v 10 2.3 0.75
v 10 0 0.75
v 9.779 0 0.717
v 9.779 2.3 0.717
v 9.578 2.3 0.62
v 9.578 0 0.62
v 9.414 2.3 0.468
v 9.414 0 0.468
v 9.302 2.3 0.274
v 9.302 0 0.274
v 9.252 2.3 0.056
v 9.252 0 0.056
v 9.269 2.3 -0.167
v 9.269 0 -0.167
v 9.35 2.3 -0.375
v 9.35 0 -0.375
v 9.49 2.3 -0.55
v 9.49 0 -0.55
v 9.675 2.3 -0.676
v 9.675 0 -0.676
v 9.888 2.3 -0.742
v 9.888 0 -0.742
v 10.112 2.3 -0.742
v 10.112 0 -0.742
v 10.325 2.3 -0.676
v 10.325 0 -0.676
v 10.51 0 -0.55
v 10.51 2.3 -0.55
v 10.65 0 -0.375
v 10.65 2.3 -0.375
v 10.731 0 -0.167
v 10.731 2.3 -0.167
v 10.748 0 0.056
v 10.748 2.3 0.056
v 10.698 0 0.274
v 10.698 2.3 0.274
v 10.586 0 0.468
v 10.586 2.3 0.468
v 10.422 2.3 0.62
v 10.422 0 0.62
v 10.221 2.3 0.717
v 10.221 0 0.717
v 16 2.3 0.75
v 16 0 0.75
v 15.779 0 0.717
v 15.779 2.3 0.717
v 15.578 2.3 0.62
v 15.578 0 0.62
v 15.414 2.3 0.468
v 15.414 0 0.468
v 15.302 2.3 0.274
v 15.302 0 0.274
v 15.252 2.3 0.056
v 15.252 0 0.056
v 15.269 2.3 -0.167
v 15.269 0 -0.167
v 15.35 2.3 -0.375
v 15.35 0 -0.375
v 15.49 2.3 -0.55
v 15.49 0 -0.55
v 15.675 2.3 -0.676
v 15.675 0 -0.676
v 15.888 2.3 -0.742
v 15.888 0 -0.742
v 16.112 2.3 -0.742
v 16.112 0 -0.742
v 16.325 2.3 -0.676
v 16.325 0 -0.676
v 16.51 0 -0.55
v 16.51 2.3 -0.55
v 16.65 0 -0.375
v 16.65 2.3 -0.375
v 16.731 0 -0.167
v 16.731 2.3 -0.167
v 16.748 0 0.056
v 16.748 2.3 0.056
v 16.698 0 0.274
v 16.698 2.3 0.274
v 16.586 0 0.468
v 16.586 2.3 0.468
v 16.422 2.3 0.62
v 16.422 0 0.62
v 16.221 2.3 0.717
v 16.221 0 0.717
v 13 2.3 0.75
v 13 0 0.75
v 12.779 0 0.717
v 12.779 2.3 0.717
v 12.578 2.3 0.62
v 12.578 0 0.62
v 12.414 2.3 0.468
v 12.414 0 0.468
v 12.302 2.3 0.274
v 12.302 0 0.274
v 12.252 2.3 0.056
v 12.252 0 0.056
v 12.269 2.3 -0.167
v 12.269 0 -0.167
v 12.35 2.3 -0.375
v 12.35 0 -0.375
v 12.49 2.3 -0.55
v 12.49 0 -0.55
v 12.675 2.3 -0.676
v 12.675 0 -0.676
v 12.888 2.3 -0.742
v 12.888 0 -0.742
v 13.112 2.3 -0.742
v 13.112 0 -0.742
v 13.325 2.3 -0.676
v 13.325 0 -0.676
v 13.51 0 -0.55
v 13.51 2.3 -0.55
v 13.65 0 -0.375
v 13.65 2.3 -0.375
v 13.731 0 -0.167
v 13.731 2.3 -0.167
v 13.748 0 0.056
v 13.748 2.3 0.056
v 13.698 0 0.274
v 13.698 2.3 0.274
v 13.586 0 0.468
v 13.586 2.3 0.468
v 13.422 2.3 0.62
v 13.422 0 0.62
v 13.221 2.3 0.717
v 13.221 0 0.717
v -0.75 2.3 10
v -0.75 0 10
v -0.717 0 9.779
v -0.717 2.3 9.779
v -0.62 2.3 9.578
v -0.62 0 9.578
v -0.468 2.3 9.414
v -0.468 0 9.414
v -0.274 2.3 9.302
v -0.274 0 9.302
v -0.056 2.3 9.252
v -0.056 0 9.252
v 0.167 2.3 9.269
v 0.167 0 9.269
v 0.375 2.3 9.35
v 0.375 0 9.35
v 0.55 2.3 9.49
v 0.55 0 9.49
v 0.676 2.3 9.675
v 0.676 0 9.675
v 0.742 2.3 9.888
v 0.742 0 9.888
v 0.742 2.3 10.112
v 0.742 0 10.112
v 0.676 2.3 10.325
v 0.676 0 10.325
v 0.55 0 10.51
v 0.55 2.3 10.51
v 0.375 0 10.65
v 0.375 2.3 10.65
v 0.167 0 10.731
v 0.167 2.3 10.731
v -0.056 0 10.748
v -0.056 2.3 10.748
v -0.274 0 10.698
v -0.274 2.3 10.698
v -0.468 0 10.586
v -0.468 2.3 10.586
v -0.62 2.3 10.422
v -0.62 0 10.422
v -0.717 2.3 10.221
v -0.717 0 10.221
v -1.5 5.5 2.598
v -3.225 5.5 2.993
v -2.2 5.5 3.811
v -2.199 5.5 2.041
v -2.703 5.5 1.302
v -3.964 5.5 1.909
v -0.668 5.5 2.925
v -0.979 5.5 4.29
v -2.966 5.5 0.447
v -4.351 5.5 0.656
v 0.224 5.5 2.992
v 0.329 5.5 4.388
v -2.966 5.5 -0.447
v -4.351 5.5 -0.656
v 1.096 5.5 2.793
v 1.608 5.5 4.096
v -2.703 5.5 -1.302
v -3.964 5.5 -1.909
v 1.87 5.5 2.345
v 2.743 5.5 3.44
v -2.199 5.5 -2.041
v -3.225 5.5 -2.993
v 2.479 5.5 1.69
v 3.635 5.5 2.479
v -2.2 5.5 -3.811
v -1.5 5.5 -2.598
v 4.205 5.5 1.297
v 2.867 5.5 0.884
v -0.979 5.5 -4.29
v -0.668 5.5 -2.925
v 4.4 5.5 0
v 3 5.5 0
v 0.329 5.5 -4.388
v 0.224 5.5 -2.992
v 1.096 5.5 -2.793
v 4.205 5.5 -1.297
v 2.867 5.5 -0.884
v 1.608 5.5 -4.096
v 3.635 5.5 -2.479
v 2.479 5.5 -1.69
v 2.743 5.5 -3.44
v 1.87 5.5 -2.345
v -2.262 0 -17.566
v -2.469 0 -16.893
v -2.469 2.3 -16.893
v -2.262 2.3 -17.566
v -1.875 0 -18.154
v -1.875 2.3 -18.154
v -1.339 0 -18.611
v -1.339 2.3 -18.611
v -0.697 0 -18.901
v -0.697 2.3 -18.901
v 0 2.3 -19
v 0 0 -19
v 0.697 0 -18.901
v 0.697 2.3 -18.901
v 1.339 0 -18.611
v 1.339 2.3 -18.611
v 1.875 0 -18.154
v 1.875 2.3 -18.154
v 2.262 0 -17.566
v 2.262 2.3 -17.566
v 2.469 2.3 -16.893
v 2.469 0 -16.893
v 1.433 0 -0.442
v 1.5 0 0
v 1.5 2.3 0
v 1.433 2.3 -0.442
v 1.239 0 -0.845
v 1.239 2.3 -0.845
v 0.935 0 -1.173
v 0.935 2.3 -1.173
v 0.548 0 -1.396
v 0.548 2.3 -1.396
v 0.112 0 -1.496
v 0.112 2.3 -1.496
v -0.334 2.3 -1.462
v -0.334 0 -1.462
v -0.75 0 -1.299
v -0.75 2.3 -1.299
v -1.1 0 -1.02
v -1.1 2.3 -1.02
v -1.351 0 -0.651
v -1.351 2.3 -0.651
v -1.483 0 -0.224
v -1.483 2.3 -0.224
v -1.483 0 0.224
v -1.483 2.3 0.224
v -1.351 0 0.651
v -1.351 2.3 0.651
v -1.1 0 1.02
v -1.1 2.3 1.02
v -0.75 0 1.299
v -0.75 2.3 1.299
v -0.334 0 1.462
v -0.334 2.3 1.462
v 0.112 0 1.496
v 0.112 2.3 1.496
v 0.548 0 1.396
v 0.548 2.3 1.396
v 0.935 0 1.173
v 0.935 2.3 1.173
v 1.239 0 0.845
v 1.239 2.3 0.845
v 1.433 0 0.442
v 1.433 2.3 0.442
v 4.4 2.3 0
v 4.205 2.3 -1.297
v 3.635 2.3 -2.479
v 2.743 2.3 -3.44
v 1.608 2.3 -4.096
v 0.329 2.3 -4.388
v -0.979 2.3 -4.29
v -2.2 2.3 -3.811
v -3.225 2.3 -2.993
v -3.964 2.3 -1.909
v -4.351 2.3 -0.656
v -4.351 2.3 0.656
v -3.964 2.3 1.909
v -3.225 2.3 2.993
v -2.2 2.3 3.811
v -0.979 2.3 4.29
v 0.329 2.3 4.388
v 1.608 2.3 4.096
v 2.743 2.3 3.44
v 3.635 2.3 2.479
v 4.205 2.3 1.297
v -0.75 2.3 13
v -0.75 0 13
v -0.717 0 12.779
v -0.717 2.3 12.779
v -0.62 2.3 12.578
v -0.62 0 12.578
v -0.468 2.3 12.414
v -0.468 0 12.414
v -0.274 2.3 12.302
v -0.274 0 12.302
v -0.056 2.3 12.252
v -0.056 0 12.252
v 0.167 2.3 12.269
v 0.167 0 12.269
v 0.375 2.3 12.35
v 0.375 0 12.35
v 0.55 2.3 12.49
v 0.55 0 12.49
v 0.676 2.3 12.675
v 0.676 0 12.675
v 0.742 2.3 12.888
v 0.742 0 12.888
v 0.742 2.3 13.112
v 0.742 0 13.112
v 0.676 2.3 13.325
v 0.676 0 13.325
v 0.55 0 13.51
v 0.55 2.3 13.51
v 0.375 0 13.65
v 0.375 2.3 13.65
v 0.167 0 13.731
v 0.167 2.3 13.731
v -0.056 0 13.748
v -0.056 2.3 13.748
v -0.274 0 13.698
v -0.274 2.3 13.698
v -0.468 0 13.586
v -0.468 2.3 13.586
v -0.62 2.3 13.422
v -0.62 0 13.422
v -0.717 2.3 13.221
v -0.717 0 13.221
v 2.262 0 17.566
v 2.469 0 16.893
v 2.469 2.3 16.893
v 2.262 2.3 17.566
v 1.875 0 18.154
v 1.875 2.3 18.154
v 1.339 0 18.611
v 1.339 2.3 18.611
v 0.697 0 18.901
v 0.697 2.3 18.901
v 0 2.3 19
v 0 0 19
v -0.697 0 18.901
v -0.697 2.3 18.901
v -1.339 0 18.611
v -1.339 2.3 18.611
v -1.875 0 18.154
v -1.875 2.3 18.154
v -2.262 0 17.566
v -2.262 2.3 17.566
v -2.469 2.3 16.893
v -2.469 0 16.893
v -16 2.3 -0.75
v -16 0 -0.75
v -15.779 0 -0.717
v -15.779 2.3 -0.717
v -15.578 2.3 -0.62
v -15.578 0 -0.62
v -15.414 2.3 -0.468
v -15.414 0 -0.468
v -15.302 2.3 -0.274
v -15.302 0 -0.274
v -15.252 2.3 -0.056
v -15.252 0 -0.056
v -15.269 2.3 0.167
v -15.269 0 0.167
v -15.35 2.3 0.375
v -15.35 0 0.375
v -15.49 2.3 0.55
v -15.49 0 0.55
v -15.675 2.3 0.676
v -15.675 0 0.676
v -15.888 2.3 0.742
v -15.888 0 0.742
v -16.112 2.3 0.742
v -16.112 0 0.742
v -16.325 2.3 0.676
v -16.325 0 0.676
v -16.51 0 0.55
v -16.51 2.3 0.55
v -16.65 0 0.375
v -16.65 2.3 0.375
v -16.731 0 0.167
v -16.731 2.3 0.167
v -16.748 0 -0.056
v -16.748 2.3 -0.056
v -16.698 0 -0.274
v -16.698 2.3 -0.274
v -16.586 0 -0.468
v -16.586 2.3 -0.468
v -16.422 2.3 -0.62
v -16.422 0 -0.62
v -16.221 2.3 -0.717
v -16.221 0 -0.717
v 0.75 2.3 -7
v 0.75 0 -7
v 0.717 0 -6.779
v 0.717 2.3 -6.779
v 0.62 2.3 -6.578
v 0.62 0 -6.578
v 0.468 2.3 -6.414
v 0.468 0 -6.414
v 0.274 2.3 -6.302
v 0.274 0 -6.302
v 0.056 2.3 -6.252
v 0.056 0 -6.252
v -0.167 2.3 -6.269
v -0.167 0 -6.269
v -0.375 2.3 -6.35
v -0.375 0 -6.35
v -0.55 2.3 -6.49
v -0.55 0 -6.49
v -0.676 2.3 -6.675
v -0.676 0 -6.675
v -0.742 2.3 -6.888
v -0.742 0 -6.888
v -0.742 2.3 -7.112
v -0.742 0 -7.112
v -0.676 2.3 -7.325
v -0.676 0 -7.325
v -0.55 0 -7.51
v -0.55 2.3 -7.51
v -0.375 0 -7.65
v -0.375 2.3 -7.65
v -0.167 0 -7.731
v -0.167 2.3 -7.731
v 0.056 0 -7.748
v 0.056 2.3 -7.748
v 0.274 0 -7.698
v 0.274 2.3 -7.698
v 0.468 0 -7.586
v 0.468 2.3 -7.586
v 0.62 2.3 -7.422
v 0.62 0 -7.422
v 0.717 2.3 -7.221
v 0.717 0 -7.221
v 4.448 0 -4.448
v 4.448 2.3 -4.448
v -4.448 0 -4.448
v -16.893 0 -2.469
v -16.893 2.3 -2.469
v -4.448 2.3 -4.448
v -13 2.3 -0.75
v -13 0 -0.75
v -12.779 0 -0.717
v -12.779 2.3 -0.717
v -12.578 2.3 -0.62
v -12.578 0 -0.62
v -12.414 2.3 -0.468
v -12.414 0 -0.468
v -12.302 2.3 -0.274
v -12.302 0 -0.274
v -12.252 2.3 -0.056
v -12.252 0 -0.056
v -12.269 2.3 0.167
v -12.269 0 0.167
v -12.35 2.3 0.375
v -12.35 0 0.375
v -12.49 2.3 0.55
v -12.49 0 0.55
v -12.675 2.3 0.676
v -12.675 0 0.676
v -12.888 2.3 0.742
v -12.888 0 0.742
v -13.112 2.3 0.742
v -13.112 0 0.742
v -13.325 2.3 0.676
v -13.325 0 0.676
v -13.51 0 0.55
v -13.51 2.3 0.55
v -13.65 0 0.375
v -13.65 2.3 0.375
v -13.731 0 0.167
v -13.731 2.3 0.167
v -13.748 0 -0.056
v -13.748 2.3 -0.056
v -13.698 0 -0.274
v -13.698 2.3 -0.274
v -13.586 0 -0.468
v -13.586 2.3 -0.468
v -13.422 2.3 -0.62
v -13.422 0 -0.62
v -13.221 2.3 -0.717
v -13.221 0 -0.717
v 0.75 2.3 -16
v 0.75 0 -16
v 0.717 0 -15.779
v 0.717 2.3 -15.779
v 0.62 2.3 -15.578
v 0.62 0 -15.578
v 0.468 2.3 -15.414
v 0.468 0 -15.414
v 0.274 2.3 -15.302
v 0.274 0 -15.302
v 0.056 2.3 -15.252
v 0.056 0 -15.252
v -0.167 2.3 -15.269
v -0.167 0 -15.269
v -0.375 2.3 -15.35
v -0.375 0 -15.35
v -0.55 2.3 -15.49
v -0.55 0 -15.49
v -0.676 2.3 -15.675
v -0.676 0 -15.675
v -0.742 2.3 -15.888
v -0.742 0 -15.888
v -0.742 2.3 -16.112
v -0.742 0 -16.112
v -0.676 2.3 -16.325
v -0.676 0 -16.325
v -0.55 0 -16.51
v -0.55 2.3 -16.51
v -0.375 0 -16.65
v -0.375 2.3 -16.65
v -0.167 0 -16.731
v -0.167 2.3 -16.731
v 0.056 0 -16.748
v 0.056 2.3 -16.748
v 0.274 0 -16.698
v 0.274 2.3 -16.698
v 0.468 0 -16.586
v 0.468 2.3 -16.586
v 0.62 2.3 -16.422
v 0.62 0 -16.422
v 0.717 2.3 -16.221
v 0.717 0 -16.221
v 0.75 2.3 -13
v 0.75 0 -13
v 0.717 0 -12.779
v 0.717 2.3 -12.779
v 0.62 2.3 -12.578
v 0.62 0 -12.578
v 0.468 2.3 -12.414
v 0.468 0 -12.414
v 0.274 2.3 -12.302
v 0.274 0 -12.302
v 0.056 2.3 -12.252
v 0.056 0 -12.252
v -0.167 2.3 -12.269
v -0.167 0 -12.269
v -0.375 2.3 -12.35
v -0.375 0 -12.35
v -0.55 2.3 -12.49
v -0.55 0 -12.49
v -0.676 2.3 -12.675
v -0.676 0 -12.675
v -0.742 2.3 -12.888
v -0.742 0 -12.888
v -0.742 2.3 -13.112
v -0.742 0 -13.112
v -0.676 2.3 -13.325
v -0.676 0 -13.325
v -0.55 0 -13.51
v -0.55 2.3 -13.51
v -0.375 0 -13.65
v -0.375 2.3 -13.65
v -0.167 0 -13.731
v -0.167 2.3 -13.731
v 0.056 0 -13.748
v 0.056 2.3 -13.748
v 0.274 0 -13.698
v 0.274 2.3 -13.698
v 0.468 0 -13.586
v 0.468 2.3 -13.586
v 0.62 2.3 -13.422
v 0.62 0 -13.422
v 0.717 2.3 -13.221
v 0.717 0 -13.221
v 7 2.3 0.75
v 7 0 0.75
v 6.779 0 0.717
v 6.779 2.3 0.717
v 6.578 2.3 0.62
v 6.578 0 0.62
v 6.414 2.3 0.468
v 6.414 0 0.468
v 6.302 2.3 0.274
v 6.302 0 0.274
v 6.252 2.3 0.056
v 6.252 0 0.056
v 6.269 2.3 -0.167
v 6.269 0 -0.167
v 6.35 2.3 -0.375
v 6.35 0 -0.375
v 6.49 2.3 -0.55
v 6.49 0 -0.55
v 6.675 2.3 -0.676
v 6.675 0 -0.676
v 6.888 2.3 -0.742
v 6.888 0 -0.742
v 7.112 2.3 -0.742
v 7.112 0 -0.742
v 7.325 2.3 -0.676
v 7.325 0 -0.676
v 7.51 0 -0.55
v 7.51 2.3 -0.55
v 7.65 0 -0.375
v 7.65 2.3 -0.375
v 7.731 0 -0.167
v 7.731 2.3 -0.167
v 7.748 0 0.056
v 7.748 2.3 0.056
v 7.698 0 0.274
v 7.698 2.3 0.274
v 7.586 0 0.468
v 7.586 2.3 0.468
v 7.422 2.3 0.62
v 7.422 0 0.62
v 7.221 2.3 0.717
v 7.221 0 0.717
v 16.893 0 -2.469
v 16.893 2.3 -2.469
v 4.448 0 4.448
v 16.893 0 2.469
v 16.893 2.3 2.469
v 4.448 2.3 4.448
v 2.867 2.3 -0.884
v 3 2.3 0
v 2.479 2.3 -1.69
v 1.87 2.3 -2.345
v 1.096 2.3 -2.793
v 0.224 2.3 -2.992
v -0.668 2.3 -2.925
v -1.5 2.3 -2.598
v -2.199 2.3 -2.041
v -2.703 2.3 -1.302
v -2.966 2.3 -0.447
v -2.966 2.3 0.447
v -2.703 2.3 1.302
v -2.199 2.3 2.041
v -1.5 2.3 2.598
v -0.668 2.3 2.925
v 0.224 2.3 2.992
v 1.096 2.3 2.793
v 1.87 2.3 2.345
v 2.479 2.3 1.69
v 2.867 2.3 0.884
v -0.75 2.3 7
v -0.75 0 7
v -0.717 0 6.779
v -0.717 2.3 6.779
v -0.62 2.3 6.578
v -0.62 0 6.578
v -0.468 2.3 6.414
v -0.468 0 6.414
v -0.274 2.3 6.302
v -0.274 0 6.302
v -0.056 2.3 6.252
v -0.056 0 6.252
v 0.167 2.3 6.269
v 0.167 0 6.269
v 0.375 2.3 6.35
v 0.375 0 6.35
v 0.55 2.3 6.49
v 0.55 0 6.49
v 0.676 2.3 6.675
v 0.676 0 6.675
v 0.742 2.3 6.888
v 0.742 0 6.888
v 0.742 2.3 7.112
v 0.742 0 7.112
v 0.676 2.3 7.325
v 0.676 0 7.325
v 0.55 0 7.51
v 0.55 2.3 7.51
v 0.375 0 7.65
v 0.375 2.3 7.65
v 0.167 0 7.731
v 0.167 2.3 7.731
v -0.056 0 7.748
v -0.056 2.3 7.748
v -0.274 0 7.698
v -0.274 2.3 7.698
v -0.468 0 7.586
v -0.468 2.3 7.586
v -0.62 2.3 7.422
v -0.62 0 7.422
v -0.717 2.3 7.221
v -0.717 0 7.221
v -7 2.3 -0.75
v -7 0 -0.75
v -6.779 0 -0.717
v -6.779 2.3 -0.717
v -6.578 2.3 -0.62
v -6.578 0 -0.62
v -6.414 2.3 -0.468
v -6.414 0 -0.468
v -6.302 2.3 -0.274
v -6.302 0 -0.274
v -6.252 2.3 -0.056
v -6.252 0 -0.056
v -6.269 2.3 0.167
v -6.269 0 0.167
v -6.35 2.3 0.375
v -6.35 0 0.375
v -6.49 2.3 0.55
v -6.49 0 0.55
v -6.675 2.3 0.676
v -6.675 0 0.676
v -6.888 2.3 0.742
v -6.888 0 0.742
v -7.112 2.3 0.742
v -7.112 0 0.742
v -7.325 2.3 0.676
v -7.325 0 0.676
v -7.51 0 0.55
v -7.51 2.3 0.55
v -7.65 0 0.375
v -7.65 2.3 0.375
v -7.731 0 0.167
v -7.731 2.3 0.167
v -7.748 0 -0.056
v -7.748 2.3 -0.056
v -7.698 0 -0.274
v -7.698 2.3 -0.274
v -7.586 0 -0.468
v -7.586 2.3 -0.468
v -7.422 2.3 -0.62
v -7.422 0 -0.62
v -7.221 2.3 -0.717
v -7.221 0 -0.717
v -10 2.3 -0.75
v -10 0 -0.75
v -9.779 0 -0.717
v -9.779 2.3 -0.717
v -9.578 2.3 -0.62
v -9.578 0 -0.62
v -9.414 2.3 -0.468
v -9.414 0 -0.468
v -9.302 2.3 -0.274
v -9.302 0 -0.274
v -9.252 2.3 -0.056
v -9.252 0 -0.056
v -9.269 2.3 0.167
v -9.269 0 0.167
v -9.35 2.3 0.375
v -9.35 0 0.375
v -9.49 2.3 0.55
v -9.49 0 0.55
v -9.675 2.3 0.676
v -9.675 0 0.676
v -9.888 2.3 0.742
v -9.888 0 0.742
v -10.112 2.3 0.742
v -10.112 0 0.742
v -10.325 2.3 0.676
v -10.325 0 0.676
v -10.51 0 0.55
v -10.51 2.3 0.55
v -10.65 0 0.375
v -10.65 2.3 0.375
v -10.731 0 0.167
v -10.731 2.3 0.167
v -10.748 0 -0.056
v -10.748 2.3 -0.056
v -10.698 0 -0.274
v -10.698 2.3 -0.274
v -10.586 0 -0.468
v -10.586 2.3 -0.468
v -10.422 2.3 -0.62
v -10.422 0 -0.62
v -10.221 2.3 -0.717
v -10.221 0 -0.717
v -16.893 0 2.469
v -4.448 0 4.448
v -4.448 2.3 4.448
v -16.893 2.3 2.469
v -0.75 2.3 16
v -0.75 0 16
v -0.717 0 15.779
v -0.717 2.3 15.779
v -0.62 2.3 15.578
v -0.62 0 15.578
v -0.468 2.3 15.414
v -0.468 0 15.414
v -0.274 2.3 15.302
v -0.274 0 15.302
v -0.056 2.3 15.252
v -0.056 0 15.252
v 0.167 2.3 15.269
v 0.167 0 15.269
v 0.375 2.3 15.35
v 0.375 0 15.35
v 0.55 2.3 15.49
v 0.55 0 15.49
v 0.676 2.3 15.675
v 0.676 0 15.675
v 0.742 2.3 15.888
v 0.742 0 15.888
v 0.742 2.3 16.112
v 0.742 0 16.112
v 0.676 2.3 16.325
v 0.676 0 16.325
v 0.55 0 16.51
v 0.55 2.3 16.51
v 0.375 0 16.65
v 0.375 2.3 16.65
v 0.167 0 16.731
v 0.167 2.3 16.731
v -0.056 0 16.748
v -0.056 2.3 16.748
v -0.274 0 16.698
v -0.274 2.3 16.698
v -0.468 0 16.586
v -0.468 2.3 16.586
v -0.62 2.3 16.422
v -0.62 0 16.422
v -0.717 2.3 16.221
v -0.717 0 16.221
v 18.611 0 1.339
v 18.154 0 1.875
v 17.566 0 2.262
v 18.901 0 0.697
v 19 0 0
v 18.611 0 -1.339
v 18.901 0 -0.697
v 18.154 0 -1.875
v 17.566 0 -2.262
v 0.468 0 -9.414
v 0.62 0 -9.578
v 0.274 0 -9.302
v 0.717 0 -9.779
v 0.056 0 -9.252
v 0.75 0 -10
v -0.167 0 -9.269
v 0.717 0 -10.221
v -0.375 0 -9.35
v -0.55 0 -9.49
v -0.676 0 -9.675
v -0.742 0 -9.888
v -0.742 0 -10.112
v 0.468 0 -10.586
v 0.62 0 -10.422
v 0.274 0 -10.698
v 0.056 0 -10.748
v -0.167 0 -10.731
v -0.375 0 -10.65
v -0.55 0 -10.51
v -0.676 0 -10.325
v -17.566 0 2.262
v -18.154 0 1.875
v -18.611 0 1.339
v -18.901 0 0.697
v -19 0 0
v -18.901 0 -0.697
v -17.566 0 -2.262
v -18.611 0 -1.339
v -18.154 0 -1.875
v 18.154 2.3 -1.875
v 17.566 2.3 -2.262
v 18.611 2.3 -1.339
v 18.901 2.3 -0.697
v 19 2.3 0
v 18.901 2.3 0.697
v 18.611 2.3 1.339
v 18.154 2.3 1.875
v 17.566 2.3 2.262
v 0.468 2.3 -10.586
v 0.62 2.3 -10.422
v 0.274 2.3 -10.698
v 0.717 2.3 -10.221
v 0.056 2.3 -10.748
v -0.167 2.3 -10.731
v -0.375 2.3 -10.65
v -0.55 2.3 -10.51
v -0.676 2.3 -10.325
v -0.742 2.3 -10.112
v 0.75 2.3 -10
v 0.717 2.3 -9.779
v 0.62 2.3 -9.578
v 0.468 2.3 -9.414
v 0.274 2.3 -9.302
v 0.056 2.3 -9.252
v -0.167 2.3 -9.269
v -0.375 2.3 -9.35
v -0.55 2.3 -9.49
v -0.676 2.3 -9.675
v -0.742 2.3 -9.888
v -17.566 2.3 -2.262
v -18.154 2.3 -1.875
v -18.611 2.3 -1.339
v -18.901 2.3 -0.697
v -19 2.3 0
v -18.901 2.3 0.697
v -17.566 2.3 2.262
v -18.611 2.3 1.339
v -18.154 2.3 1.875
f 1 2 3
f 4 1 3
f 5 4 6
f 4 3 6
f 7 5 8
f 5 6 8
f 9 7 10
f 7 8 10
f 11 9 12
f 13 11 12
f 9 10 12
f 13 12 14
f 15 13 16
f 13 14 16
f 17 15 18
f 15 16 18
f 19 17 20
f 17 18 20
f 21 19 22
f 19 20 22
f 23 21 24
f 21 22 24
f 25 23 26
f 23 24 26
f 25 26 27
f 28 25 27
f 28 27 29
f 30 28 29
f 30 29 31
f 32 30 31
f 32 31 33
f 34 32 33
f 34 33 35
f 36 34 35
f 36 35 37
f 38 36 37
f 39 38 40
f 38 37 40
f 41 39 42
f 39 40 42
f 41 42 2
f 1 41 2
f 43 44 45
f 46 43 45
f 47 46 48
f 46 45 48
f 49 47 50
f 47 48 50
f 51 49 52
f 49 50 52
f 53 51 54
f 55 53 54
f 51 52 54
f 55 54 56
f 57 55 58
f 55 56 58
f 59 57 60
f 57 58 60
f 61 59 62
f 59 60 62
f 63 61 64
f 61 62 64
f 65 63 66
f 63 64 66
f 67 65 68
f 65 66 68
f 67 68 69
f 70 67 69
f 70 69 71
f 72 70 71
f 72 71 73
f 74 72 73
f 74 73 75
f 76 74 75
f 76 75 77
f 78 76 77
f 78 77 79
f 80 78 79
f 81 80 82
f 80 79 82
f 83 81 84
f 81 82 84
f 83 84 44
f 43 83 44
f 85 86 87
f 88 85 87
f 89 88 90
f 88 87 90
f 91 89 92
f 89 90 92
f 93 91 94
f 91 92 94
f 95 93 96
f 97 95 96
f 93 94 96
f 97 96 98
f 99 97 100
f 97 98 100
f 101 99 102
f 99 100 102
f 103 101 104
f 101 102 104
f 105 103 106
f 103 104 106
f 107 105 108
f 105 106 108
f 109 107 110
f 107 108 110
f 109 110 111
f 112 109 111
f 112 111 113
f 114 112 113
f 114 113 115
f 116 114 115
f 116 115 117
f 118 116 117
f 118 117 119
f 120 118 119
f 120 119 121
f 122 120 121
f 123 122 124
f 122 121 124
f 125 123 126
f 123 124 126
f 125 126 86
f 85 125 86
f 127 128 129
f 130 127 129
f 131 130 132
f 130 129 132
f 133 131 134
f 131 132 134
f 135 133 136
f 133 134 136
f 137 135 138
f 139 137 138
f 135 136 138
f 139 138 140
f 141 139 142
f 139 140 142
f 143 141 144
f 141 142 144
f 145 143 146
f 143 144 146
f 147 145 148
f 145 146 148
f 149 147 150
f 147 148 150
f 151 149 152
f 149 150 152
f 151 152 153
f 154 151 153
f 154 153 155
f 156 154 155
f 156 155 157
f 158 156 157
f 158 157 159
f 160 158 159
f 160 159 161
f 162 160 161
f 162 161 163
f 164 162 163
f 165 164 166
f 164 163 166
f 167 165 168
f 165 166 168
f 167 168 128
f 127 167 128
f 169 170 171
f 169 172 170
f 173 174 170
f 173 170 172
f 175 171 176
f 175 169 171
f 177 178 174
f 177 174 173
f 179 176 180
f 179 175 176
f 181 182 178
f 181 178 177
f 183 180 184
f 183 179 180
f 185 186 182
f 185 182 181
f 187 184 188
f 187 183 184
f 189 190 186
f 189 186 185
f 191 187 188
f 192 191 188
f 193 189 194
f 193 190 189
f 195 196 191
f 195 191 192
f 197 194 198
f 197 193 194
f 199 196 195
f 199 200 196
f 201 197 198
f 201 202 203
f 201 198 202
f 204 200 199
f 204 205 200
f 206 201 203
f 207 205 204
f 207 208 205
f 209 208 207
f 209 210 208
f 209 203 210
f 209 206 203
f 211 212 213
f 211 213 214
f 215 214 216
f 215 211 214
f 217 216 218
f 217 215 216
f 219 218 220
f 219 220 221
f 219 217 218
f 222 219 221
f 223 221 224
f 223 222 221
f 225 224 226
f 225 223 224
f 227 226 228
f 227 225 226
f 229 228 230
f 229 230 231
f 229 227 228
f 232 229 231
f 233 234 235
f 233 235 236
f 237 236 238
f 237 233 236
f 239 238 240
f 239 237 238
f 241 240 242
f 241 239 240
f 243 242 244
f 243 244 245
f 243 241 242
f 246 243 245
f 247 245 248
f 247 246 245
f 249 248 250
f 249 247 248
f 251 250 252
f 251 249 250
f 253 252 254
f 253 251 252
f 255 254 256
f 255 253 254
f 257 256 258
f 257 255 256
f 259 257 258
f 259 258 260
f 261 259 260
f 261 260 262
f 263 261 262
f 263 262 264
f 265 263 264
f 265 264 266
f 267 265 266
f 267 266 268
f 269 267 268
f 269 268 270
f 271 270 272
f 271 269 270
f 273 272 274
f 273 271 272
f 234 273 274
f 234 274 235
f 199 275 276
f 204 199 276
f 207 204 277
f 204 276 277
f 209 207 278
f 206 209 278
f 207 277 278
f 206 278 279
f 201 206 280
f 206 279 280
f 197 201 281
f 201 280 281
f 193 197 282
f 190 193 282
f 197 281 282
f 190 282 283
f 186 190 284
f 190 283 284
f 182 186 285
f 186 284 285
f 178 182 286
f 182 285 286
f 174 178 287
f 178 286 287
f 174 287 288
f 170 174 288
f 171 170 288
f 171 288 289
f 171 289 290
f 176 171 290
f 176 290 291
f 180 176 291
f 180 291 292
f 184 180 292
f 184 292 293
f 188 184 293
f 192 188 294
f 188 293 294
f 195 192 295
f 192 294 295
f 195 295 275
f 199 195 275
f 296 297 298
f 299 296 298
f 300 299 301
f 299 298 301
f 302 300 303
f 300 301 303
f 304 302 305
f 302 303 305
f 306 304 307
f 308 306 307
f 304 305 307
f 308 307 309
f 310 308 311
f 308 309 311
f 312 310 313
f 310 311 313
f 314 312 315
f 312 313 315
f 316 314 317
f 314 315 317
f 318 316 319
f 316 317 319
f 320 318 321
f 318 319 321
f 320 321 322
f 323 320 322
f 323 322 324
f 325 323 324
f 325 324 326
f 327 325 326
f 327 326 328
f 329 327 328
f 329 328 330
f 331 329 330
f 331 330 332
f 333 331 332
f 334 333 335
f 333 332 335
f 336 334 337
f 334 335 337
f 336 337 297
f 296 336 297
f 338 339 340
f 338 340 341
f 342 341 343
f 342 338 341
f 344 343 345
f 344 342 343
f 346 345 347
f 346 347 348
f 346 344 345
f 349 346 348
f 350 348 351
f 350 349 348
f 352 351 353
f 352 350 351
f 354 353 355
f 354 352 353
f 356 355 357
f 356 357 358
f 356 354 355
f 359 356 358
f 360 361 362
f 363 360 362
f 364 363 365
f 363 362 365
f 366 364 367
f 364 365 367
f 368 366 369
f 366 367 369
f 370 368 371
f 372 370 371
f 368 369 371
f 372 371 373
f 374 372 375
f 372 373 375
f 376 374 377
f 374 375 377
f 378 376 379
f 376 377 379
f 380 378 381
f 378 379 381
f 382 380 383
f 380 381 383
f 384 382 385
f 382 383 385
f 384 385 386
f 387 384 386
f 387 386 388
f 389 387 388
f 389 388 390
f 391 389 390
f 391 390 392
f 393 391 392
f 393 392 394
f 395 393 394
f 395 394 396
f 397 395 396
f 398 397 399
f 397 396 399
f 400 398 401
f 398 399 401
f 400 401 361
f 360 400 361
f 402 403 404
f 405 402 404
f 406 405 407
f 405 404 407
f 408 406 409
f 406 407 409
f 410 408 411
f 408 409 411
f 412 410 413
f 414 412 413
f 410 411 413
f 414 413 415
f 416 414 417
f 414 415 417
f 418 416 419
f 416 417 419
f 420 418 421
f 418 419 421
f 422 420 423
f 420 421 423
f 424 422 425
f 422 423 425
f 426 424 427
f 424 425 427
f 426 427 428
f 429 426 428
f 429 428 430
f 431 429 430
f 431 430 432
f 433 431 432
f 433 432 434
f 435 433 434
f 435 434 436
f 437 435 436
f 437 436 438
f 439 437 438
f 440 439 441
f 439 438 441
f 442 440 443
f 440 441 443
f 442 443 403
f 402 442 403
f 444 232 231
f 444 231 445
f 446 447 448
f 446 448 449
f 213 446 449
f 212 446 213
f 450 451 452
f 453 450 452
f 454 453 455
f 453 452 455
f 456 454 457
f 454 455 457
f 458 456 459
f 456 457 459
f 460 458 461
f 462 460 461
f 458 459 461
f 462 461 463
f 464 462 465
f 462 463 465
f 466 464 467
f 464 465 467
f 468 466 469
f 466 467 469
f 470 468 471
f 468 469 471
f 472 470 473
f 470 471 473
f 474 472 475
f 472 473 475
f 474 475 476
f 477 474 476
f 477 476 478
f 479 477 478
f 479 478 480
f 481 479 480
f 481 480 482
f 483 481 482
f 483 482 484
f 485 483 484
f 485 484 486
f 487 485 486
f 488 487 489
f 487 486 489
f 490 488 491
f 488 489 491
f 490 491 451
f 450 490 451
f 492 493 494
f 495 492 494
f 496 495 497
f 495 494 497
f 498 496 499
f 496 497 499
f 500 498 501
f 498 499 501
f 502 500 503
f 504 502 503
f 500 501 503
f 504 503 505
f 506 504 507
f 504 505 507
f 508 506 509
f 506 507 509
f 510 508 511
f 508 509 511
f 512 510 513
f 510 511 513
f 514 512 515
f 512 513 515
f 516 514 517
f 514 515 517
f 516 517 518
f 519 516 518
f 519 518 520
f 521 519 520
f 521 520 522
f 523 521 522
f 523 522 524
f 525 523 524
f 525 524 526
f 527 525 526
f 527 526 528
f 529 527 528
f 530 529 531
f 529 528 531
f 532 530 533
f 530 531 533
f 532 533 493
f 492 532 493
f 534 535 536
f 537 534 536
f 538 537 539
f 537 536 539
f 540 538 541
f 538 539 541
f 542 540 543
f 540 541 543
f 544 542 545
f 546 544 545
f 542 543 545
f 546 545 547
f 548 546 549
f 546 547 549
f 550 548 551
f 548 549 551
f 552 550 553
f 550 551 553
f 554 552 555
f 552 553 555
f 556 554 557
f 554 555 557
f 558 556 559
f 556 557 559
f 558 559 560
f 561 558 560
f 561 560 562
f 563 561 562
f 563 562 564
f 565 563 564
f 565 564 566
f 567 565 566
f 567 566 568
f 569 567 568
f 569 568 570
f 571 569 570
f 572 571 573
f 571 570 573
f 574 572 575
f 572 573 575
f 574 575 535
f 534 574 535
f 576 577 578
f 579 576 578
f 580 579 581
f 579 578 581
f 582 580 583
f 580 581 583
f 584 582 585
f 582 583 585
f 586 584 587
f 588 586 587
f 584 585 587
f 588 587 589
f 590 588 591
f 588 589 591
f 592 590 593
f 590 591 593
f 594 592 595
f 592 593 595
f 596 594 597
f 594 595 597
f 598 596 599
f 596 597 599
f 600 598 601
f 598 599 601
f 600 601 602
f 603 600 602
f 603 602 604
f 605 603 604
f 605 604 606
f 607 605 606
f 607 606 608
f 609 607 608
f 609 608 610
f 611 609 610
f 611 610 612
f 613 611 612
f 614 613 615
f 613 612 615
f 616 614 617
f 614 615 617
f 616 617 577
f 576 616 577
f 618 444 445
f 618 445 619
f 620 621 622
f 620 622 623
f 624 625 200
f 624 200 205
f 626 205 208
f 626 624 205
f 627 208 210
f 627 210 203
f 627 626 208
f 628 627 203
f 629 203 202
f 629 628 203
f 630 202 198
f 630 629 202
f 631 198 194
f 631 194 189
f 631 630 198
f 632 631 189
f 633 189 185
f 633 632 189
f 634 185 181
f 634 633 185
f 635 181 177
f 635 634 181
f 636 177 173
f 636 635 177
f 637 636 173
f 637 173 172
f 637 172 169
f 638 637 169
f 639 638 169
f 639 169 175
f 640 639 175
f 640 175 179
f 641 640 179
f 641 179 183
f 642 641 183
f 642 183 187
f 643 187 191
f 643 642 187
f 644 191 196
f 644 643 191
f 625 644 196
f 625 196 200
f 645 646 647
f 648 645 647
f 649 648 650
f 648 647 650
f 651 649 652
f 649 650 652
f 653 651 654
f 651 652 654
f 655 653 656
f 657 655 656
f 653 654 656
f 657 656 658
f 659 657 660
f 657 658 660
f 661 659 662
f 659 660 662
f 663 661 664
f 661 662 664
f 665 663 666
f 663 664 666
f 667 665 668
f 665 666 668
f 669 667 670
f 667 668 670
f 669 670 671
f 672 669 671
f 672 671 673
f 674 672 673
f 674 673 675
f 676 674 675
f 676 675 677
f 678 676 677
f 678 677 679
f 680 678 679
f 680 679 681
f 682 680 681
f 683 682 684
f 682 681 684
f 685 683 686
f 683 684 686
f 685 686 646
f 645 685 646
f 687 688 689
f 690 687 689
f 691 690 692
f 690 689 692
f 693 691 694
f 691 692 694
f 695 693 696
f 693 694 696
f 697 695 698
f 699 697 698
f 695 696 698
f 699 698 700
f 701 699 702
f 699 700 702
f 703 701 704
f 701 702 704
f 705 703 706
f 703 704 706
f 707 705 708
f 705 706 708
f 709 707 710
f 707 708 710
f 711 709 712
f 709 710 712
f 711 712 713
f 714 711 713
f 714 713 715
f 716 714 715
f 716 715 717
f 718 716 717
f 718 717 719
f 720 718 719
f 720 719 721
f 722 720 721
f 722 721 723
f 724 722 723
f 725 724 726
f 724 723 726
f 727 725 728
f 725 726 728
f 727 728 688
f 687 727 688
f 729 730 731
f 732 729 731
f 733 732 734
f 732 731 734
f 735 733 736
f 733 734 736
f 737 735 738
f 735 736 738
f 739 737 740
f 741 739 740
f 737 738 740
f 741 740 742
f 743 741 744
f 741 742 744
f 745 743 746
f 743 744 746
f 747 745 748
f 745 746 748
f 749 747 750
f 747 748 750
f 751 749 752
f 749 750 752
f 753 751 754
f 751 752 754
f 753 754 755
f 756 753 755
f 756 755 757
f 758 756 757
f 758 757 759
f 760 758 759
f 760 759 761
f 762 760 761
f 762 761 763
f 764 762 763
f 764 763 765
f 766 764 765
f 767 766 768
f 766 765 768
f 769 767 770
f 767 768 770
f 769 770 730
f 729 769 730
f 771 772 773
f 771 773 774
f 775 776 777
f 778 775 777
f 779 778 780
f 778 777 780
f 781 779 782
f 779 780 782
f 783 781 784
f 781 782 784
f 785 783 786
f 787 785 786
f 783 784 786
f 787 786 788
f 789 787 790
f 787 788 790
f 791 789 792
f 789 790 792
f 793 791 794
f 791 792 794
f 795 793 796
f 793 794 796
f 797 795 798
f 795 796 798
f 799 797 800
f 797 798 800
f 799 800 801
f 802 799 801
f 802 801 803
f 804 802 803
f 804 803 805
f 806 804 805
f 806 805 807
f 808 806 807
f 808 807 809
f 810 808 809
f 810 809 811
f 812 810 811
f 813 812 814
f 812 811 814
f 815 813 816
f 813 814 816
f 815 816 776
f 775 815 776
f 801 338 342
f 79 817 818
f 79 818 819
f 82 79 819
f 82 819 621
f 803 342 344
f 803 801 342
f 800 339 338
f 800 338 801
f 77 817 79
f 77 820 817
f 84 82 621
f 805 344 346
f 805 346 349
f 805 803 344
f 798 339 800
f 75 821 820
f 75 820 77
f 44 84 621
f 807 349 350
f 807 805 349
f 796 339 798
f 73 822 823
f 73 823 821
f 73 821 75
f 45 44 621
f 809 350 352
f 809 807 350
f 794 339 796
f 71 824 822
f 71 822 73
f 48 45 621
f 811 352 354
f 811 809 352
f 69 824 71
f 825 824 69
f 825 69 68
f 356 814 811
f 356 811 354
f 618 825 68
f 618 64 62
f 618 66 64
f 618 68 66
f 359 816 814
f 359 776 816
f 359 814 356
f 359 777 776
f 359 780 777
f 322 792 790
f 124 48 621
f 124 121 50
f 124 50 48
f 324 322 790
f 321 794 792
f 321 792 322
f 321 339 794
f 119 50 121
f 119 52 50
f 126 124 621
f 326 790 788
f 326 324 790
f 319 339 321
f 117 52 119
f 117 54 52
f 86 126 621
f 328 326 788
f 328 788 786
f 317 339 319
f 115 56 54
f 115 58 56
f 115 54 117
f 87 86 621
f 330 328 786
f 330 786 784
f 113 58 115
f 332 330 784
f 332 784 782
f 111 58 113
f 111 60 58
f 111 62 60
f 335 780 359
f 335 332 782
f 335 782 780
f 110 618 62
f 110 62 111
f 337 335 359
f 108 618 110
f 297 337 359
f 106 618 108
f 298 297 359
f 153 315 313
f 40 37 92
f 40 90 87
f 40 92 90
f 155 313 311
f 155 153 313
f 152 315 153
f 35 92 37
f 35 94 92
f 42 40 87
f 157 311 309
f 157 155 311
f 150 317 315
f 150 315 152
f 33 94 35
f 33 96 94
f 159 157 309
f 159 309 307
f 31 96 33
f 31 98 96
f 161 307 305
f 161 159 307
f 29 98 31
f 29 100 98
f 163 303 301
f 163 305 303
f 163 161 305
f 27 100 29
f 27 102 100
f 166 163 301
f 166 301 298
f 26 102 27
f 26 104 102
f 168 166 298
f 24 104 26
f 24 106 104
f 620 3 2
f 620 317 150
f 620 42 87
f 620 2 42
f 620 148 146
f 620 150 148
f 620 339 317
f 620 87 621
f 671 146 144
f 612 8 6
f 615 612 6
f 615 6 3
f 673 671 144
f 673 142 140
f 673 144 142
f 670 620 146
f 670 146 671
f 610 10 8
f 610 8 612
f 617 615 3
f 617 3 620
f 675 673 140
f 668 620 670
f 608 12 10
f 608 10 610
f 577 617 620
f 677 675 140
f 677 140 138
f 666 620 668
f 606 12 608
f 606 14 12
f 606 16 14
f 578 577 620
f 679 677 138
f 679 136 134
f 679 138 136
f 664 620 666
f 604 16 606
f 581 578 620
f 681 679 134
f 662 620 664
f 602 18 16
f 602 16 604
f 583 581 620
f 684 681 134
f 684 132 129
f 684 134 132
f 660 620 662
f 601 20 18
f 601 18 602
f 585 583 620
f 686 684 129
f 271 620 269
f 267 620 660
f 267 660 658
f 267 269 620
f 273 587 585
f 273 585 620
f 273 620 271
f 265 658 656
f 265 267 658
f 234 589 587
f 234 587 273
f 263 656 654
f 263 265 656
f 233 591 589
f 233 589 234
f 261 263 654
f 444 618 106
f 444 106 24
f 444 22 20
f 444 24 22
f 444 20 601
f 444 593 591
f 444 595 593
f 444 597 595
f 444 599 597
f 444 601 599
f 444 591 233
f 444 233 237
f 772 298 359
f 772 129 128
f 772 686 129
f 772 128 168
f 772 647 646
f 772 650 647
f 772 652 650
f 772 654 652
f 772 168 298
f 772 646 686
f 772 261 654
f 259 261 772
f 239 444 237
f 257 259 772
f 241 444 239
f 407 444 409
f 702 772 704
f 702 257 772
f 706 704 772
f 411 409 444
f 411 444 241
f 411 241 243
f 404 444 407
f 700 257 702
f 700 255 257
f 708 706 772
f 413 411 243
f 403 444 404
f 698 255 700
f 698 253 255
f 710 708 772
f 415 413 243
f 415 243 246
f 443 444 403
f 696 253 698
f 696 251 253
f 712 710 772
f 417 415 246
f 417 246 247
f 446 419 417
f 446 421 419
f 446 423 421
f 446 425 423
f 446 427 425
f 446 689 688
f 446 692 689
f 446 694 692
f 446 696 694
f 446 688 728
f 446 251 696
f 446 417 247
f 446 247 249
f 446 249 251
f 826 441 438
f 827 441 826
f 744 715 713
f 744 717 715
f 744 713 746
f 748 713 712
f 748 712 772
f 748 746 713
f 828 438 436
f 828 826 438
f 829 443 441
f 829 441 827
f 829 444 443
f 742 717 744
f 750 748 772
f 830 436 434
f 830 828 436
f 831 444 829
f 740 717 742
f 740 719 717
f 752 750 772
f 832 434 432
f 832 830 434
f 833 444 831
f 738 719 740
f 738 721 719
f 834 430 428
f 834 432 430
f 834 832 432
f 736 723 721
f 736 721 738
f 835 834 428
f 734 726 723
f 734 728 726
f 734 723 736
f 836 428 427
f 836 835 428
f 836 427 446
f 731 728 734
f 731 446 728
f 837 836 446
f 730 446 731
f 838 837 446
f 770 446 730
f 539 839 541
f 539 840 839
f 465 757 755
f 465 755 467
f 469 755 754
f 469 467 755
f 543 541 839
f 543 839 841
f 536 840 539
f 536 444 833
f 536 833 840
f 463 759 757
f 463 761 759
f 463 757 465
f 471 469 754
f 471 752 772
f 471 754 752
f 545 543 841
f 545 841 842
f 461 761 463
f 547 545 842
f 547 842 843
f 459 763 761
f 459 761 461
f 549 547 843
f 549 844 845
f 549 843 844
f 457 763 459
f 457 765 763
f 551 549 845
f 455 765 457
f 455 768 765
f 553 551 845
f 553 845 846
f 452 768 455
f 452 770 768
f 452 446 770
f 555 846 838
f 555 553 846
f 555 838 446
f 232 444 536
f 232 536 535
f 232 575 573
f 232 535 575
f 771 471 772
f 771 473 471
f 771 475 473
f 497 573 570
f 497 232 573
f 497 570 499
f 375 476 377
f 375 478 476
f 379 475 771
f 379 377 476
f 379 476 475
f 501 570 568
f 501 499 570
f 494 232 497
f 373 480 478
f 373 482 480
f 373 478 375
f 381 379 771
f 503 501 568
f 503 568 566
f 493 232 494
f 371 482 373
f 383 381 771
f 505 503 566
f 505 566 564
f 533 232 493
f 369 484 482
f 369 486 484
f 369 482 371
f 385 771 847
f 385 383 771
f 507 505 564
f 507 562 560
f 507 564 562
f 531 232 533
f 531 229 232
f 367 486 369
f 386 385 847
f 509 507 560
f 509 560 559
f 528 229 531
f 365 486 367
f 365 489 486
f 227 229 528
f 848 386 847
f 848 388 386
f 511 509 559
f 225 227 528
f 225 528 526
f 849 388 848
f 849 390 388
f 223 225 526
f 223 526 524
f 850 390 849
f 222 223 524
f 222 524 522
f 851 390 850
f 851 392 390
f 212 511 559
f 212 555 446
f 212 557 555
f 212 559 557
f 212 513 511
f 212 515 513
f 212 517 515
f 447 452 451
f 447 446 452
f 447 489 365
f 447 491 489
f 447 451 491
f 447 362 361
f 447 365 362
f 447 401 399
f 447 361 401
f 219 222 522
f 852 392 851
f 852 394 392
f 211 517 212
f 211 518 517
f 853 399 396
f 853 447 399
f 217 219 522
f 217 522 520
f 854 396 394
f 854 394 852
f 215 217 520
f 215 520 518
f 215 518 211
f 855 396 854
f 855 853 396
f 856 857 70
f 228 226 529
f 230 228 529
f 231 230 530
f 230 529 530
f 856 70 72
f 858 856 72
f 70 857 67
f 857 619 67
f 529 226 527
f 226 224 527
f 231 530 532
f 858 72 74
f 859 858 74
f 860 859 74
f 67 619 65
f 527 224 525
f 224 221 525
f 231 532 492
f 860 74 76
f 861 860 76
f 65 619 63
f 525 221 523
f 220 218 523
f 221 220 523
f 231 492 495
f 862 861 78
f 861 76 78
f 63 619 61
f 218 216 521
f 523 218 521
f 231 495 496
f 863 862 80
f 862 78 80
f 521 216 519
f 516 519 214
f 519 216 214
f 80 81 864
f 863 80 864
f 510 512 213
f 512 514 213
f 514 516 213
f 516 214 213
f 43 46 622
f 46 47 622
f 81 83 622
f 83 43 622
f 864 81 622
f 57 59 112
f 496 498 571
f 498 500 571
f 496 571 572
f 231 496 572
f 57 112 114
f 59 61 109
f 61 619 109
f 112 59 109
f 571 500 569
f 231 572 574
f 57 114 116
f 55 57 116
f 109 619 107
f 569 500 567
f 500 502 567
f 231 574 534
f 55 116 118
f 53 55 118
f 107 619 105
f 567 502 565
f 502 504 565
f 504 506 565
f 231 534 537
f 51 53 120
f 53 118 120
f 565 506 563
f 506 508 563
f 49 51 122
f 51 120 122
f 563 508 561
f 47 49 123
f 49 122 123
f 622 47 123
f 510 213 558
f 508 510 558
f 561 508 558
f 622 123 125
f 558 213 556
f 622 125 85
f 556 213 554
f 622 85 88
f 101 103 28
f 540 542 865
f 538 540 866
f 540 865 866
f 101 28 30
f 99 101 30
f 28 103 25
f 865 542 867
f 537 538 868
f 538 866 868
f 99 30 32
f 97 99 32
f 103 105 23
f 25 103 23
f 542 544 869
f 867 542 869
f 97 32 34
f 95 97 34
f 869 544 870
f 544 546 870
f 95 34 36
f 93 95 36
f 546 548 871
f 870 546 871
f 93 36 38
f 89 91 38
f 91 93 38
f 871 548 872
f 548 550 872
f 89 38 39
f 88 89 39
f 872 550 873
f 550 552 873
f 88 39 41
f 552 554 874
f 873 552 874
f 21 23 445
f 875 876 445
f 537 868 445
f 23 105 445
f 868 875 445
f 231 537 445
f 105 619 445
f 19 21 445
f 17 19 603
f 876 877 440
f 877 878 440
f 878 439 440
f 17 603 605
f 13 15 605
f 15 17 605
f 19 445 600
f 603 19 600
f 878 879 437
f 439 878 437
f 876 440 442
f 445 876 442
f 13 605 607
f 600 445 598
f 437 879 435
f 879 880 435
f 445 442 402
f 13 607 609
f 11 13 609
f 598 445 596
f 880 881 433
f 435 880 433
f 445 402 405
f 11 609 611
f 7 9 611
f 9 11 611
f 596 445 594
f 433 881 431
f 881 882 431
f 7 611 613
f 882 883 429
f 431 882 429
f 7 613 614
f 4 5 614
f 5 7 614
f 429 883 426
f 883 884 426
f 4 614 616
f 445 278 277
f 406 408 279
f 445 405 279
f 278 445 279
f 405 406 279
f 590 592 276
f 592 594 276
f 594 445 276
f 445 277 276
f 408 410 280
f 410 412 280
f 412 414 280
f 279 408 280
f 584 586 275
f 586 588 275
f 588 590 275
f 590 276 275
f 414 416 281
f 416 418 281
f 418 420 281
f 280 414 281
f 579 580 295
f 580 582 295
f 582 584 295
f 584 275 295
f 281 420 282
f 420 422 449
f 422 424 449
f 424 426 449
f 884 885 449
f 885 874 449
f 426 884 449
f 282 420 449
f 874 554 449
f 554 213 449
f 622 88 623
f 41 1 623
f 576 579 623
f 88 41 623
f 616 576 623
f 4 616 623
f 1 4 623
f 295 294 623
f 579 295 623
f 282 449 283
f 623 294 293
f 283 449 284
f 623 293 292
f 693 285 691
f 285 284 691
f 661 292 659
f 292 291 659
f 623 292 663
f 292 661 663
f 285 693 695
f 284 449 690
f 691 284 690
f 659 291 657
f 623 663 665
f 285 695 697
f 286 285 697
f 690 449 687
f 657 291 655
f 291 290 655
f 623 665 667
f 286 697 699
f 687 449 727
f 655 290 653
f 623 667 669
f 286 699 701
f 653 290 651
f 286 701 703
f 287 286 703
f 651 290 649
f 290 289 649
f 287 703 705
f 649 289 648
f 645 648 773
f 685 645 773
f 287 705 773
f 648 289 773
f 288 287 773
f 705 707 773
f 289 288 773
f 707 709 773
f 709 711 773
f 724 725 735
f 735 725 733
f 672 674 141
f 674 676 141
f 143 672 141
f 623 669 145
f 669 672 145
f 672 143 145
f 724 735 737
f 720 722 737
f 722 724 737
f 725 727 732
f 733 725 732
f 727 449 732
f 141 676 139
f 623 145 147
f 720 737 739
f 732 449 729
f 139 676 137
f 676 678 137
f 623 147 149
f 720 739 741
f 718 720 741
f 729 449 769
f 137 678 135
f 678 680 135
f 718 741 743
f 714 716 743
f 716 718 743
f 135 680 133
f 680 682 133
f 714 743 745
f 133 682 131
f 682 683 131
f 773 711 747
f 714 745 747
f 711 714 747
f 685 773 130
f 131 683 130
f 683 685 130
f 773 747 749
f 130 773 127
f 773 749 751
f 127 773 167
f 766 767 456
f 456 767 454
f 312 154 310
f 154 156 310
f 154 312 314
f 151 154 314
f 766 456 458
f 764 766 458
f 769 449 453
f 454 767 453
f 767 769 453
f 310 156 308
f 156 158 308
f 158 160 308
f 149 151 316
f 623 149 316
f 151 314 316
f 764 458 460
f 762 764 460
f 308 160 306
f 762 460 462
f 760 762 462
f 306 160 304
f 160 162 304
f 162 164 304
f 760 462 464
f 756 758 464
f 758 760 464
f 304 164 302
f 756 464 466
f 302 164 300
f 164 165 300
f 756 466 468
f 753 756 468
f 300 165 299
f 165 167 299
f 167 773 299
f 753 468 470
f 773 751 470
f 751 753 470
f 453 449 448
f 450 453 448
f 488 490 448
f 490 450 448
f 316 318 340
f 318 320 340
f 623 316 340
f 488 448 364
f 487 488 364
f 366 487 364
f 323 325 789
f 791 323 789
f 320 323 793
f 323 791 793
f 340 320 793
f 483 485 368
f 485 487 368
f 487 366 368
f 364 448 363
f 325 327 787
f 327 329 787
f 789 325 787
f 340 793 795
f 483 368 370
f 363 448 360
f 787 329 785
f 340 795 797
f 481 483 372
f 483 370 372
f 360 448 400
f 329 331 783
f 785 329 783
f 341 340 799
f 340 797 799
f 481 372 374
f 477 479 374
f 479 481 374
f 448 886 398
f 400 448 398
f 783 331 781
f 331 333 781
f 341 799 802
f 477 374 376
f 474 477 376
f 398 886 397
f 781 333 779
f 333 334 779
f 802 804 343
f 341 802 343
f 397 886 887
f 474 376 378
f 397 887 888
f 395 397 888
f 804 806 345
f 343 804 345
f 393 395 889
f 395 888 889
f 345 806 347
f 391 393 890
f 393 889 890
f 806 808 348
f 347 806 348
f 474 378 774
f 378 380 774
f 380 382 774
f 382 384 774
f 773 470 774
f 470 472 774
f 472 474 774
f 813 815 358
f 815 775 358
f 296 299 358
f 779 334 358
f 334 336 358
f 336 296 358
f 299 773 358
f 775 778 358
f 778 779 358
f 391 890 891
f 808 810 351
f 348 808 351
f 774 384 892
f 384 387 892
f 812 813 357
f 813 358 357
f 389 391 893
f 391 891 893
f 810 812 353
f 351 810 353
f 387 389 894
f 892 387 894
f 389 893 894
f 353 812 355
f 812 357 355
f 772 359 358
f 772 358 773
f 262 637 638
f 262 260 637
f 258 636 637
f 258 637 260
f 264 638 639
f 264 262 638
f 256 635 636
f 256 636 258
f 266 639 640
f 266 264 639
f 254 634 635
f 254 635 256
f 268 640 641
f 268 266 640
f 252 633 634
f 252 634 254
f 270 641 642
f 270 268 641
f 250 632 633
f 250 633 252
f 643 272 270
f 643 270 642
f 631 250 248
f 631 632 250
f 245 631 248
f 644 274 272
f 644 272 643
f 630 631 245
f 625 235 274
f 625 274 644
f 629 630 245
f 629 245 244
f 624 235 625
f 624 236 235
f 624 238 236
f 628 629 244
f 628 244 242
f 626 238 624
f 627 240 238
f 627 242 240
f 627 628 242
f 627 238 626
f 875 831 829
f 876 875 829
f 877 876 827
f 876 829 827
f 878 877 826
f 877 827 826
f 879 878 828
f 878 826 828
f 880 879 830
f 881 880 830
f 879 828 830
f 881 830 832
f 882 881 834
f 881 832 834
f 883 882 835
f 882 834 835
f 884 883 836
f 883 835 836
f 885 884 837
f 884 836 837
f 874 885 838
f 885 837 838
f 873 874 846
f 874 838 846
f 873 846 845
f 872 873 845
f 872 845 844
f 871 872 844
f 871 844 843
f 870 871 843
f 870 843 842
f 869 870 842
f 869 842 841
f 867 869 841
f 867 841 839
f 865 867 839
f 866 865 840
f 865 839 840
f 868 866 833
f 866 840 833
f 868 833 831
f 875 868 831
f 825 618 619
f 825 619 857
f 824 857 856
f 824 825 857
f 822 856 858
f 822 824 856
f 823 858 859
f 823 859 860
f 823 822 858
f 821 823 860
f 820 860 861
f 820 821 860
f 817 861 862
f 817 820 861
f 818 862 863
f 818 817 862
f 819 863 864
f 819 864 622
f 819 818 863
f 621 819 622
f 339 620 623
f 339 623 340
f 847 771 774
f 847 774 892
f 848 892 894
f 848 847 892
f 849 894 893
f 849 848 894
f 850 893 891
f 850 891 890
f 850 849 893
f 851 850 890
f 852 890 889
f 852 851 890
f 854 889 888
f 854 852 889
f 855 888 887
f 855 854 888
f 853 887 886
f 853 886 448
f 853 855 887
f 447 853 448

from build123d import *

# Parameters (mm, degrees)
SKETCH1_R           = 6.1
SKETCH1_R_2         = 1.5
BOSS_EXTRUDE1_DEPTH = 2.3
SKETCH2_R           = 4.4
SKETCH2_R_2         = 3
BOSS_EXTRUDE2_DEPTH = 3.2
SKETCH3_R           = 0.75
BOSS_EXTRUDE3_DEPTH = 2.3
CIRPATTERN1_COUNT   = 4


with BuildPart() as part:
    # Sketch1 → Boss-Extrude1 (new body)
    with BuildSketch(Plane(origin=(0, 0, 0), x_dir=(1, 0, 0), z_dir=(0, 1, 0))):
        Circle(SKETCH1_R)
        Circle(SKETCH1_R_2, mode=Mode.SUBTRACT)
    extrude(amount=BOSS_EXTRUDE1_DEPTH)

    # Sketch2 → Boss-Extrude2 (add)
    with BuildSketch(Plane(origin=(0, 2.3, 0), x_dir=(1, 0, 0), z_dir=(0, 1, 0))):
        Circle(SKETCH2_R)
        Circle(SKETCH2_R_2, mode=Mode.SUBTRACT)
    extrude(amount=BOSS_EXTRUDE2_DEPTH)

    # Sketch3 → Boss-Extrude3 (add)
    with BuildSketch(Plane.XZ):
        with BuildLine():
            Line((-4.5, -4.118252056), (-2.468988638, -16.892549493))
            ThreePointArc((-2.468988638, -16.892549493), (0, -19), (2.468988638, -16.892549493))
            Line((2.468988638, -16.892549493), (4.5, -4.118252056))
            ThreePointArc((4.5, -4.118252056), (0, -6.1), (-4.5, -4.118252056))
        make_face()
        with Locations((0, -16)):
            Circle(SKETCH3_R, mode=Mode.SUBTRACT)
        with Locations((0, -13)):
            Circle(SKETCH3_R, mode=Mode.SUBTRACT)
        with Locations((0, -10)):
            Circle(SKETCH3_R, mode=Mode.SUBTRACT)
        with Locations((0, -7)):
            Circle(SKETCH3_R, mode=Mode.SUBTRACT)
    boss_extrude3 = extrude(amount=-BOSS_EXTRUDE3_DEPTH)

    # CirPattern1: Boss-Extrude3 ×4 about axis
    cirpattern1_axis = Axis((0, 0, 0), (0, 1, 0))
    for i in range(1, CIRPATTERN1_COUNT):
        add(boss_extrude3.rotate(cirpattern1_axis, i * 360 / CIRPATTERN1_COUNT))


solid = part.part
